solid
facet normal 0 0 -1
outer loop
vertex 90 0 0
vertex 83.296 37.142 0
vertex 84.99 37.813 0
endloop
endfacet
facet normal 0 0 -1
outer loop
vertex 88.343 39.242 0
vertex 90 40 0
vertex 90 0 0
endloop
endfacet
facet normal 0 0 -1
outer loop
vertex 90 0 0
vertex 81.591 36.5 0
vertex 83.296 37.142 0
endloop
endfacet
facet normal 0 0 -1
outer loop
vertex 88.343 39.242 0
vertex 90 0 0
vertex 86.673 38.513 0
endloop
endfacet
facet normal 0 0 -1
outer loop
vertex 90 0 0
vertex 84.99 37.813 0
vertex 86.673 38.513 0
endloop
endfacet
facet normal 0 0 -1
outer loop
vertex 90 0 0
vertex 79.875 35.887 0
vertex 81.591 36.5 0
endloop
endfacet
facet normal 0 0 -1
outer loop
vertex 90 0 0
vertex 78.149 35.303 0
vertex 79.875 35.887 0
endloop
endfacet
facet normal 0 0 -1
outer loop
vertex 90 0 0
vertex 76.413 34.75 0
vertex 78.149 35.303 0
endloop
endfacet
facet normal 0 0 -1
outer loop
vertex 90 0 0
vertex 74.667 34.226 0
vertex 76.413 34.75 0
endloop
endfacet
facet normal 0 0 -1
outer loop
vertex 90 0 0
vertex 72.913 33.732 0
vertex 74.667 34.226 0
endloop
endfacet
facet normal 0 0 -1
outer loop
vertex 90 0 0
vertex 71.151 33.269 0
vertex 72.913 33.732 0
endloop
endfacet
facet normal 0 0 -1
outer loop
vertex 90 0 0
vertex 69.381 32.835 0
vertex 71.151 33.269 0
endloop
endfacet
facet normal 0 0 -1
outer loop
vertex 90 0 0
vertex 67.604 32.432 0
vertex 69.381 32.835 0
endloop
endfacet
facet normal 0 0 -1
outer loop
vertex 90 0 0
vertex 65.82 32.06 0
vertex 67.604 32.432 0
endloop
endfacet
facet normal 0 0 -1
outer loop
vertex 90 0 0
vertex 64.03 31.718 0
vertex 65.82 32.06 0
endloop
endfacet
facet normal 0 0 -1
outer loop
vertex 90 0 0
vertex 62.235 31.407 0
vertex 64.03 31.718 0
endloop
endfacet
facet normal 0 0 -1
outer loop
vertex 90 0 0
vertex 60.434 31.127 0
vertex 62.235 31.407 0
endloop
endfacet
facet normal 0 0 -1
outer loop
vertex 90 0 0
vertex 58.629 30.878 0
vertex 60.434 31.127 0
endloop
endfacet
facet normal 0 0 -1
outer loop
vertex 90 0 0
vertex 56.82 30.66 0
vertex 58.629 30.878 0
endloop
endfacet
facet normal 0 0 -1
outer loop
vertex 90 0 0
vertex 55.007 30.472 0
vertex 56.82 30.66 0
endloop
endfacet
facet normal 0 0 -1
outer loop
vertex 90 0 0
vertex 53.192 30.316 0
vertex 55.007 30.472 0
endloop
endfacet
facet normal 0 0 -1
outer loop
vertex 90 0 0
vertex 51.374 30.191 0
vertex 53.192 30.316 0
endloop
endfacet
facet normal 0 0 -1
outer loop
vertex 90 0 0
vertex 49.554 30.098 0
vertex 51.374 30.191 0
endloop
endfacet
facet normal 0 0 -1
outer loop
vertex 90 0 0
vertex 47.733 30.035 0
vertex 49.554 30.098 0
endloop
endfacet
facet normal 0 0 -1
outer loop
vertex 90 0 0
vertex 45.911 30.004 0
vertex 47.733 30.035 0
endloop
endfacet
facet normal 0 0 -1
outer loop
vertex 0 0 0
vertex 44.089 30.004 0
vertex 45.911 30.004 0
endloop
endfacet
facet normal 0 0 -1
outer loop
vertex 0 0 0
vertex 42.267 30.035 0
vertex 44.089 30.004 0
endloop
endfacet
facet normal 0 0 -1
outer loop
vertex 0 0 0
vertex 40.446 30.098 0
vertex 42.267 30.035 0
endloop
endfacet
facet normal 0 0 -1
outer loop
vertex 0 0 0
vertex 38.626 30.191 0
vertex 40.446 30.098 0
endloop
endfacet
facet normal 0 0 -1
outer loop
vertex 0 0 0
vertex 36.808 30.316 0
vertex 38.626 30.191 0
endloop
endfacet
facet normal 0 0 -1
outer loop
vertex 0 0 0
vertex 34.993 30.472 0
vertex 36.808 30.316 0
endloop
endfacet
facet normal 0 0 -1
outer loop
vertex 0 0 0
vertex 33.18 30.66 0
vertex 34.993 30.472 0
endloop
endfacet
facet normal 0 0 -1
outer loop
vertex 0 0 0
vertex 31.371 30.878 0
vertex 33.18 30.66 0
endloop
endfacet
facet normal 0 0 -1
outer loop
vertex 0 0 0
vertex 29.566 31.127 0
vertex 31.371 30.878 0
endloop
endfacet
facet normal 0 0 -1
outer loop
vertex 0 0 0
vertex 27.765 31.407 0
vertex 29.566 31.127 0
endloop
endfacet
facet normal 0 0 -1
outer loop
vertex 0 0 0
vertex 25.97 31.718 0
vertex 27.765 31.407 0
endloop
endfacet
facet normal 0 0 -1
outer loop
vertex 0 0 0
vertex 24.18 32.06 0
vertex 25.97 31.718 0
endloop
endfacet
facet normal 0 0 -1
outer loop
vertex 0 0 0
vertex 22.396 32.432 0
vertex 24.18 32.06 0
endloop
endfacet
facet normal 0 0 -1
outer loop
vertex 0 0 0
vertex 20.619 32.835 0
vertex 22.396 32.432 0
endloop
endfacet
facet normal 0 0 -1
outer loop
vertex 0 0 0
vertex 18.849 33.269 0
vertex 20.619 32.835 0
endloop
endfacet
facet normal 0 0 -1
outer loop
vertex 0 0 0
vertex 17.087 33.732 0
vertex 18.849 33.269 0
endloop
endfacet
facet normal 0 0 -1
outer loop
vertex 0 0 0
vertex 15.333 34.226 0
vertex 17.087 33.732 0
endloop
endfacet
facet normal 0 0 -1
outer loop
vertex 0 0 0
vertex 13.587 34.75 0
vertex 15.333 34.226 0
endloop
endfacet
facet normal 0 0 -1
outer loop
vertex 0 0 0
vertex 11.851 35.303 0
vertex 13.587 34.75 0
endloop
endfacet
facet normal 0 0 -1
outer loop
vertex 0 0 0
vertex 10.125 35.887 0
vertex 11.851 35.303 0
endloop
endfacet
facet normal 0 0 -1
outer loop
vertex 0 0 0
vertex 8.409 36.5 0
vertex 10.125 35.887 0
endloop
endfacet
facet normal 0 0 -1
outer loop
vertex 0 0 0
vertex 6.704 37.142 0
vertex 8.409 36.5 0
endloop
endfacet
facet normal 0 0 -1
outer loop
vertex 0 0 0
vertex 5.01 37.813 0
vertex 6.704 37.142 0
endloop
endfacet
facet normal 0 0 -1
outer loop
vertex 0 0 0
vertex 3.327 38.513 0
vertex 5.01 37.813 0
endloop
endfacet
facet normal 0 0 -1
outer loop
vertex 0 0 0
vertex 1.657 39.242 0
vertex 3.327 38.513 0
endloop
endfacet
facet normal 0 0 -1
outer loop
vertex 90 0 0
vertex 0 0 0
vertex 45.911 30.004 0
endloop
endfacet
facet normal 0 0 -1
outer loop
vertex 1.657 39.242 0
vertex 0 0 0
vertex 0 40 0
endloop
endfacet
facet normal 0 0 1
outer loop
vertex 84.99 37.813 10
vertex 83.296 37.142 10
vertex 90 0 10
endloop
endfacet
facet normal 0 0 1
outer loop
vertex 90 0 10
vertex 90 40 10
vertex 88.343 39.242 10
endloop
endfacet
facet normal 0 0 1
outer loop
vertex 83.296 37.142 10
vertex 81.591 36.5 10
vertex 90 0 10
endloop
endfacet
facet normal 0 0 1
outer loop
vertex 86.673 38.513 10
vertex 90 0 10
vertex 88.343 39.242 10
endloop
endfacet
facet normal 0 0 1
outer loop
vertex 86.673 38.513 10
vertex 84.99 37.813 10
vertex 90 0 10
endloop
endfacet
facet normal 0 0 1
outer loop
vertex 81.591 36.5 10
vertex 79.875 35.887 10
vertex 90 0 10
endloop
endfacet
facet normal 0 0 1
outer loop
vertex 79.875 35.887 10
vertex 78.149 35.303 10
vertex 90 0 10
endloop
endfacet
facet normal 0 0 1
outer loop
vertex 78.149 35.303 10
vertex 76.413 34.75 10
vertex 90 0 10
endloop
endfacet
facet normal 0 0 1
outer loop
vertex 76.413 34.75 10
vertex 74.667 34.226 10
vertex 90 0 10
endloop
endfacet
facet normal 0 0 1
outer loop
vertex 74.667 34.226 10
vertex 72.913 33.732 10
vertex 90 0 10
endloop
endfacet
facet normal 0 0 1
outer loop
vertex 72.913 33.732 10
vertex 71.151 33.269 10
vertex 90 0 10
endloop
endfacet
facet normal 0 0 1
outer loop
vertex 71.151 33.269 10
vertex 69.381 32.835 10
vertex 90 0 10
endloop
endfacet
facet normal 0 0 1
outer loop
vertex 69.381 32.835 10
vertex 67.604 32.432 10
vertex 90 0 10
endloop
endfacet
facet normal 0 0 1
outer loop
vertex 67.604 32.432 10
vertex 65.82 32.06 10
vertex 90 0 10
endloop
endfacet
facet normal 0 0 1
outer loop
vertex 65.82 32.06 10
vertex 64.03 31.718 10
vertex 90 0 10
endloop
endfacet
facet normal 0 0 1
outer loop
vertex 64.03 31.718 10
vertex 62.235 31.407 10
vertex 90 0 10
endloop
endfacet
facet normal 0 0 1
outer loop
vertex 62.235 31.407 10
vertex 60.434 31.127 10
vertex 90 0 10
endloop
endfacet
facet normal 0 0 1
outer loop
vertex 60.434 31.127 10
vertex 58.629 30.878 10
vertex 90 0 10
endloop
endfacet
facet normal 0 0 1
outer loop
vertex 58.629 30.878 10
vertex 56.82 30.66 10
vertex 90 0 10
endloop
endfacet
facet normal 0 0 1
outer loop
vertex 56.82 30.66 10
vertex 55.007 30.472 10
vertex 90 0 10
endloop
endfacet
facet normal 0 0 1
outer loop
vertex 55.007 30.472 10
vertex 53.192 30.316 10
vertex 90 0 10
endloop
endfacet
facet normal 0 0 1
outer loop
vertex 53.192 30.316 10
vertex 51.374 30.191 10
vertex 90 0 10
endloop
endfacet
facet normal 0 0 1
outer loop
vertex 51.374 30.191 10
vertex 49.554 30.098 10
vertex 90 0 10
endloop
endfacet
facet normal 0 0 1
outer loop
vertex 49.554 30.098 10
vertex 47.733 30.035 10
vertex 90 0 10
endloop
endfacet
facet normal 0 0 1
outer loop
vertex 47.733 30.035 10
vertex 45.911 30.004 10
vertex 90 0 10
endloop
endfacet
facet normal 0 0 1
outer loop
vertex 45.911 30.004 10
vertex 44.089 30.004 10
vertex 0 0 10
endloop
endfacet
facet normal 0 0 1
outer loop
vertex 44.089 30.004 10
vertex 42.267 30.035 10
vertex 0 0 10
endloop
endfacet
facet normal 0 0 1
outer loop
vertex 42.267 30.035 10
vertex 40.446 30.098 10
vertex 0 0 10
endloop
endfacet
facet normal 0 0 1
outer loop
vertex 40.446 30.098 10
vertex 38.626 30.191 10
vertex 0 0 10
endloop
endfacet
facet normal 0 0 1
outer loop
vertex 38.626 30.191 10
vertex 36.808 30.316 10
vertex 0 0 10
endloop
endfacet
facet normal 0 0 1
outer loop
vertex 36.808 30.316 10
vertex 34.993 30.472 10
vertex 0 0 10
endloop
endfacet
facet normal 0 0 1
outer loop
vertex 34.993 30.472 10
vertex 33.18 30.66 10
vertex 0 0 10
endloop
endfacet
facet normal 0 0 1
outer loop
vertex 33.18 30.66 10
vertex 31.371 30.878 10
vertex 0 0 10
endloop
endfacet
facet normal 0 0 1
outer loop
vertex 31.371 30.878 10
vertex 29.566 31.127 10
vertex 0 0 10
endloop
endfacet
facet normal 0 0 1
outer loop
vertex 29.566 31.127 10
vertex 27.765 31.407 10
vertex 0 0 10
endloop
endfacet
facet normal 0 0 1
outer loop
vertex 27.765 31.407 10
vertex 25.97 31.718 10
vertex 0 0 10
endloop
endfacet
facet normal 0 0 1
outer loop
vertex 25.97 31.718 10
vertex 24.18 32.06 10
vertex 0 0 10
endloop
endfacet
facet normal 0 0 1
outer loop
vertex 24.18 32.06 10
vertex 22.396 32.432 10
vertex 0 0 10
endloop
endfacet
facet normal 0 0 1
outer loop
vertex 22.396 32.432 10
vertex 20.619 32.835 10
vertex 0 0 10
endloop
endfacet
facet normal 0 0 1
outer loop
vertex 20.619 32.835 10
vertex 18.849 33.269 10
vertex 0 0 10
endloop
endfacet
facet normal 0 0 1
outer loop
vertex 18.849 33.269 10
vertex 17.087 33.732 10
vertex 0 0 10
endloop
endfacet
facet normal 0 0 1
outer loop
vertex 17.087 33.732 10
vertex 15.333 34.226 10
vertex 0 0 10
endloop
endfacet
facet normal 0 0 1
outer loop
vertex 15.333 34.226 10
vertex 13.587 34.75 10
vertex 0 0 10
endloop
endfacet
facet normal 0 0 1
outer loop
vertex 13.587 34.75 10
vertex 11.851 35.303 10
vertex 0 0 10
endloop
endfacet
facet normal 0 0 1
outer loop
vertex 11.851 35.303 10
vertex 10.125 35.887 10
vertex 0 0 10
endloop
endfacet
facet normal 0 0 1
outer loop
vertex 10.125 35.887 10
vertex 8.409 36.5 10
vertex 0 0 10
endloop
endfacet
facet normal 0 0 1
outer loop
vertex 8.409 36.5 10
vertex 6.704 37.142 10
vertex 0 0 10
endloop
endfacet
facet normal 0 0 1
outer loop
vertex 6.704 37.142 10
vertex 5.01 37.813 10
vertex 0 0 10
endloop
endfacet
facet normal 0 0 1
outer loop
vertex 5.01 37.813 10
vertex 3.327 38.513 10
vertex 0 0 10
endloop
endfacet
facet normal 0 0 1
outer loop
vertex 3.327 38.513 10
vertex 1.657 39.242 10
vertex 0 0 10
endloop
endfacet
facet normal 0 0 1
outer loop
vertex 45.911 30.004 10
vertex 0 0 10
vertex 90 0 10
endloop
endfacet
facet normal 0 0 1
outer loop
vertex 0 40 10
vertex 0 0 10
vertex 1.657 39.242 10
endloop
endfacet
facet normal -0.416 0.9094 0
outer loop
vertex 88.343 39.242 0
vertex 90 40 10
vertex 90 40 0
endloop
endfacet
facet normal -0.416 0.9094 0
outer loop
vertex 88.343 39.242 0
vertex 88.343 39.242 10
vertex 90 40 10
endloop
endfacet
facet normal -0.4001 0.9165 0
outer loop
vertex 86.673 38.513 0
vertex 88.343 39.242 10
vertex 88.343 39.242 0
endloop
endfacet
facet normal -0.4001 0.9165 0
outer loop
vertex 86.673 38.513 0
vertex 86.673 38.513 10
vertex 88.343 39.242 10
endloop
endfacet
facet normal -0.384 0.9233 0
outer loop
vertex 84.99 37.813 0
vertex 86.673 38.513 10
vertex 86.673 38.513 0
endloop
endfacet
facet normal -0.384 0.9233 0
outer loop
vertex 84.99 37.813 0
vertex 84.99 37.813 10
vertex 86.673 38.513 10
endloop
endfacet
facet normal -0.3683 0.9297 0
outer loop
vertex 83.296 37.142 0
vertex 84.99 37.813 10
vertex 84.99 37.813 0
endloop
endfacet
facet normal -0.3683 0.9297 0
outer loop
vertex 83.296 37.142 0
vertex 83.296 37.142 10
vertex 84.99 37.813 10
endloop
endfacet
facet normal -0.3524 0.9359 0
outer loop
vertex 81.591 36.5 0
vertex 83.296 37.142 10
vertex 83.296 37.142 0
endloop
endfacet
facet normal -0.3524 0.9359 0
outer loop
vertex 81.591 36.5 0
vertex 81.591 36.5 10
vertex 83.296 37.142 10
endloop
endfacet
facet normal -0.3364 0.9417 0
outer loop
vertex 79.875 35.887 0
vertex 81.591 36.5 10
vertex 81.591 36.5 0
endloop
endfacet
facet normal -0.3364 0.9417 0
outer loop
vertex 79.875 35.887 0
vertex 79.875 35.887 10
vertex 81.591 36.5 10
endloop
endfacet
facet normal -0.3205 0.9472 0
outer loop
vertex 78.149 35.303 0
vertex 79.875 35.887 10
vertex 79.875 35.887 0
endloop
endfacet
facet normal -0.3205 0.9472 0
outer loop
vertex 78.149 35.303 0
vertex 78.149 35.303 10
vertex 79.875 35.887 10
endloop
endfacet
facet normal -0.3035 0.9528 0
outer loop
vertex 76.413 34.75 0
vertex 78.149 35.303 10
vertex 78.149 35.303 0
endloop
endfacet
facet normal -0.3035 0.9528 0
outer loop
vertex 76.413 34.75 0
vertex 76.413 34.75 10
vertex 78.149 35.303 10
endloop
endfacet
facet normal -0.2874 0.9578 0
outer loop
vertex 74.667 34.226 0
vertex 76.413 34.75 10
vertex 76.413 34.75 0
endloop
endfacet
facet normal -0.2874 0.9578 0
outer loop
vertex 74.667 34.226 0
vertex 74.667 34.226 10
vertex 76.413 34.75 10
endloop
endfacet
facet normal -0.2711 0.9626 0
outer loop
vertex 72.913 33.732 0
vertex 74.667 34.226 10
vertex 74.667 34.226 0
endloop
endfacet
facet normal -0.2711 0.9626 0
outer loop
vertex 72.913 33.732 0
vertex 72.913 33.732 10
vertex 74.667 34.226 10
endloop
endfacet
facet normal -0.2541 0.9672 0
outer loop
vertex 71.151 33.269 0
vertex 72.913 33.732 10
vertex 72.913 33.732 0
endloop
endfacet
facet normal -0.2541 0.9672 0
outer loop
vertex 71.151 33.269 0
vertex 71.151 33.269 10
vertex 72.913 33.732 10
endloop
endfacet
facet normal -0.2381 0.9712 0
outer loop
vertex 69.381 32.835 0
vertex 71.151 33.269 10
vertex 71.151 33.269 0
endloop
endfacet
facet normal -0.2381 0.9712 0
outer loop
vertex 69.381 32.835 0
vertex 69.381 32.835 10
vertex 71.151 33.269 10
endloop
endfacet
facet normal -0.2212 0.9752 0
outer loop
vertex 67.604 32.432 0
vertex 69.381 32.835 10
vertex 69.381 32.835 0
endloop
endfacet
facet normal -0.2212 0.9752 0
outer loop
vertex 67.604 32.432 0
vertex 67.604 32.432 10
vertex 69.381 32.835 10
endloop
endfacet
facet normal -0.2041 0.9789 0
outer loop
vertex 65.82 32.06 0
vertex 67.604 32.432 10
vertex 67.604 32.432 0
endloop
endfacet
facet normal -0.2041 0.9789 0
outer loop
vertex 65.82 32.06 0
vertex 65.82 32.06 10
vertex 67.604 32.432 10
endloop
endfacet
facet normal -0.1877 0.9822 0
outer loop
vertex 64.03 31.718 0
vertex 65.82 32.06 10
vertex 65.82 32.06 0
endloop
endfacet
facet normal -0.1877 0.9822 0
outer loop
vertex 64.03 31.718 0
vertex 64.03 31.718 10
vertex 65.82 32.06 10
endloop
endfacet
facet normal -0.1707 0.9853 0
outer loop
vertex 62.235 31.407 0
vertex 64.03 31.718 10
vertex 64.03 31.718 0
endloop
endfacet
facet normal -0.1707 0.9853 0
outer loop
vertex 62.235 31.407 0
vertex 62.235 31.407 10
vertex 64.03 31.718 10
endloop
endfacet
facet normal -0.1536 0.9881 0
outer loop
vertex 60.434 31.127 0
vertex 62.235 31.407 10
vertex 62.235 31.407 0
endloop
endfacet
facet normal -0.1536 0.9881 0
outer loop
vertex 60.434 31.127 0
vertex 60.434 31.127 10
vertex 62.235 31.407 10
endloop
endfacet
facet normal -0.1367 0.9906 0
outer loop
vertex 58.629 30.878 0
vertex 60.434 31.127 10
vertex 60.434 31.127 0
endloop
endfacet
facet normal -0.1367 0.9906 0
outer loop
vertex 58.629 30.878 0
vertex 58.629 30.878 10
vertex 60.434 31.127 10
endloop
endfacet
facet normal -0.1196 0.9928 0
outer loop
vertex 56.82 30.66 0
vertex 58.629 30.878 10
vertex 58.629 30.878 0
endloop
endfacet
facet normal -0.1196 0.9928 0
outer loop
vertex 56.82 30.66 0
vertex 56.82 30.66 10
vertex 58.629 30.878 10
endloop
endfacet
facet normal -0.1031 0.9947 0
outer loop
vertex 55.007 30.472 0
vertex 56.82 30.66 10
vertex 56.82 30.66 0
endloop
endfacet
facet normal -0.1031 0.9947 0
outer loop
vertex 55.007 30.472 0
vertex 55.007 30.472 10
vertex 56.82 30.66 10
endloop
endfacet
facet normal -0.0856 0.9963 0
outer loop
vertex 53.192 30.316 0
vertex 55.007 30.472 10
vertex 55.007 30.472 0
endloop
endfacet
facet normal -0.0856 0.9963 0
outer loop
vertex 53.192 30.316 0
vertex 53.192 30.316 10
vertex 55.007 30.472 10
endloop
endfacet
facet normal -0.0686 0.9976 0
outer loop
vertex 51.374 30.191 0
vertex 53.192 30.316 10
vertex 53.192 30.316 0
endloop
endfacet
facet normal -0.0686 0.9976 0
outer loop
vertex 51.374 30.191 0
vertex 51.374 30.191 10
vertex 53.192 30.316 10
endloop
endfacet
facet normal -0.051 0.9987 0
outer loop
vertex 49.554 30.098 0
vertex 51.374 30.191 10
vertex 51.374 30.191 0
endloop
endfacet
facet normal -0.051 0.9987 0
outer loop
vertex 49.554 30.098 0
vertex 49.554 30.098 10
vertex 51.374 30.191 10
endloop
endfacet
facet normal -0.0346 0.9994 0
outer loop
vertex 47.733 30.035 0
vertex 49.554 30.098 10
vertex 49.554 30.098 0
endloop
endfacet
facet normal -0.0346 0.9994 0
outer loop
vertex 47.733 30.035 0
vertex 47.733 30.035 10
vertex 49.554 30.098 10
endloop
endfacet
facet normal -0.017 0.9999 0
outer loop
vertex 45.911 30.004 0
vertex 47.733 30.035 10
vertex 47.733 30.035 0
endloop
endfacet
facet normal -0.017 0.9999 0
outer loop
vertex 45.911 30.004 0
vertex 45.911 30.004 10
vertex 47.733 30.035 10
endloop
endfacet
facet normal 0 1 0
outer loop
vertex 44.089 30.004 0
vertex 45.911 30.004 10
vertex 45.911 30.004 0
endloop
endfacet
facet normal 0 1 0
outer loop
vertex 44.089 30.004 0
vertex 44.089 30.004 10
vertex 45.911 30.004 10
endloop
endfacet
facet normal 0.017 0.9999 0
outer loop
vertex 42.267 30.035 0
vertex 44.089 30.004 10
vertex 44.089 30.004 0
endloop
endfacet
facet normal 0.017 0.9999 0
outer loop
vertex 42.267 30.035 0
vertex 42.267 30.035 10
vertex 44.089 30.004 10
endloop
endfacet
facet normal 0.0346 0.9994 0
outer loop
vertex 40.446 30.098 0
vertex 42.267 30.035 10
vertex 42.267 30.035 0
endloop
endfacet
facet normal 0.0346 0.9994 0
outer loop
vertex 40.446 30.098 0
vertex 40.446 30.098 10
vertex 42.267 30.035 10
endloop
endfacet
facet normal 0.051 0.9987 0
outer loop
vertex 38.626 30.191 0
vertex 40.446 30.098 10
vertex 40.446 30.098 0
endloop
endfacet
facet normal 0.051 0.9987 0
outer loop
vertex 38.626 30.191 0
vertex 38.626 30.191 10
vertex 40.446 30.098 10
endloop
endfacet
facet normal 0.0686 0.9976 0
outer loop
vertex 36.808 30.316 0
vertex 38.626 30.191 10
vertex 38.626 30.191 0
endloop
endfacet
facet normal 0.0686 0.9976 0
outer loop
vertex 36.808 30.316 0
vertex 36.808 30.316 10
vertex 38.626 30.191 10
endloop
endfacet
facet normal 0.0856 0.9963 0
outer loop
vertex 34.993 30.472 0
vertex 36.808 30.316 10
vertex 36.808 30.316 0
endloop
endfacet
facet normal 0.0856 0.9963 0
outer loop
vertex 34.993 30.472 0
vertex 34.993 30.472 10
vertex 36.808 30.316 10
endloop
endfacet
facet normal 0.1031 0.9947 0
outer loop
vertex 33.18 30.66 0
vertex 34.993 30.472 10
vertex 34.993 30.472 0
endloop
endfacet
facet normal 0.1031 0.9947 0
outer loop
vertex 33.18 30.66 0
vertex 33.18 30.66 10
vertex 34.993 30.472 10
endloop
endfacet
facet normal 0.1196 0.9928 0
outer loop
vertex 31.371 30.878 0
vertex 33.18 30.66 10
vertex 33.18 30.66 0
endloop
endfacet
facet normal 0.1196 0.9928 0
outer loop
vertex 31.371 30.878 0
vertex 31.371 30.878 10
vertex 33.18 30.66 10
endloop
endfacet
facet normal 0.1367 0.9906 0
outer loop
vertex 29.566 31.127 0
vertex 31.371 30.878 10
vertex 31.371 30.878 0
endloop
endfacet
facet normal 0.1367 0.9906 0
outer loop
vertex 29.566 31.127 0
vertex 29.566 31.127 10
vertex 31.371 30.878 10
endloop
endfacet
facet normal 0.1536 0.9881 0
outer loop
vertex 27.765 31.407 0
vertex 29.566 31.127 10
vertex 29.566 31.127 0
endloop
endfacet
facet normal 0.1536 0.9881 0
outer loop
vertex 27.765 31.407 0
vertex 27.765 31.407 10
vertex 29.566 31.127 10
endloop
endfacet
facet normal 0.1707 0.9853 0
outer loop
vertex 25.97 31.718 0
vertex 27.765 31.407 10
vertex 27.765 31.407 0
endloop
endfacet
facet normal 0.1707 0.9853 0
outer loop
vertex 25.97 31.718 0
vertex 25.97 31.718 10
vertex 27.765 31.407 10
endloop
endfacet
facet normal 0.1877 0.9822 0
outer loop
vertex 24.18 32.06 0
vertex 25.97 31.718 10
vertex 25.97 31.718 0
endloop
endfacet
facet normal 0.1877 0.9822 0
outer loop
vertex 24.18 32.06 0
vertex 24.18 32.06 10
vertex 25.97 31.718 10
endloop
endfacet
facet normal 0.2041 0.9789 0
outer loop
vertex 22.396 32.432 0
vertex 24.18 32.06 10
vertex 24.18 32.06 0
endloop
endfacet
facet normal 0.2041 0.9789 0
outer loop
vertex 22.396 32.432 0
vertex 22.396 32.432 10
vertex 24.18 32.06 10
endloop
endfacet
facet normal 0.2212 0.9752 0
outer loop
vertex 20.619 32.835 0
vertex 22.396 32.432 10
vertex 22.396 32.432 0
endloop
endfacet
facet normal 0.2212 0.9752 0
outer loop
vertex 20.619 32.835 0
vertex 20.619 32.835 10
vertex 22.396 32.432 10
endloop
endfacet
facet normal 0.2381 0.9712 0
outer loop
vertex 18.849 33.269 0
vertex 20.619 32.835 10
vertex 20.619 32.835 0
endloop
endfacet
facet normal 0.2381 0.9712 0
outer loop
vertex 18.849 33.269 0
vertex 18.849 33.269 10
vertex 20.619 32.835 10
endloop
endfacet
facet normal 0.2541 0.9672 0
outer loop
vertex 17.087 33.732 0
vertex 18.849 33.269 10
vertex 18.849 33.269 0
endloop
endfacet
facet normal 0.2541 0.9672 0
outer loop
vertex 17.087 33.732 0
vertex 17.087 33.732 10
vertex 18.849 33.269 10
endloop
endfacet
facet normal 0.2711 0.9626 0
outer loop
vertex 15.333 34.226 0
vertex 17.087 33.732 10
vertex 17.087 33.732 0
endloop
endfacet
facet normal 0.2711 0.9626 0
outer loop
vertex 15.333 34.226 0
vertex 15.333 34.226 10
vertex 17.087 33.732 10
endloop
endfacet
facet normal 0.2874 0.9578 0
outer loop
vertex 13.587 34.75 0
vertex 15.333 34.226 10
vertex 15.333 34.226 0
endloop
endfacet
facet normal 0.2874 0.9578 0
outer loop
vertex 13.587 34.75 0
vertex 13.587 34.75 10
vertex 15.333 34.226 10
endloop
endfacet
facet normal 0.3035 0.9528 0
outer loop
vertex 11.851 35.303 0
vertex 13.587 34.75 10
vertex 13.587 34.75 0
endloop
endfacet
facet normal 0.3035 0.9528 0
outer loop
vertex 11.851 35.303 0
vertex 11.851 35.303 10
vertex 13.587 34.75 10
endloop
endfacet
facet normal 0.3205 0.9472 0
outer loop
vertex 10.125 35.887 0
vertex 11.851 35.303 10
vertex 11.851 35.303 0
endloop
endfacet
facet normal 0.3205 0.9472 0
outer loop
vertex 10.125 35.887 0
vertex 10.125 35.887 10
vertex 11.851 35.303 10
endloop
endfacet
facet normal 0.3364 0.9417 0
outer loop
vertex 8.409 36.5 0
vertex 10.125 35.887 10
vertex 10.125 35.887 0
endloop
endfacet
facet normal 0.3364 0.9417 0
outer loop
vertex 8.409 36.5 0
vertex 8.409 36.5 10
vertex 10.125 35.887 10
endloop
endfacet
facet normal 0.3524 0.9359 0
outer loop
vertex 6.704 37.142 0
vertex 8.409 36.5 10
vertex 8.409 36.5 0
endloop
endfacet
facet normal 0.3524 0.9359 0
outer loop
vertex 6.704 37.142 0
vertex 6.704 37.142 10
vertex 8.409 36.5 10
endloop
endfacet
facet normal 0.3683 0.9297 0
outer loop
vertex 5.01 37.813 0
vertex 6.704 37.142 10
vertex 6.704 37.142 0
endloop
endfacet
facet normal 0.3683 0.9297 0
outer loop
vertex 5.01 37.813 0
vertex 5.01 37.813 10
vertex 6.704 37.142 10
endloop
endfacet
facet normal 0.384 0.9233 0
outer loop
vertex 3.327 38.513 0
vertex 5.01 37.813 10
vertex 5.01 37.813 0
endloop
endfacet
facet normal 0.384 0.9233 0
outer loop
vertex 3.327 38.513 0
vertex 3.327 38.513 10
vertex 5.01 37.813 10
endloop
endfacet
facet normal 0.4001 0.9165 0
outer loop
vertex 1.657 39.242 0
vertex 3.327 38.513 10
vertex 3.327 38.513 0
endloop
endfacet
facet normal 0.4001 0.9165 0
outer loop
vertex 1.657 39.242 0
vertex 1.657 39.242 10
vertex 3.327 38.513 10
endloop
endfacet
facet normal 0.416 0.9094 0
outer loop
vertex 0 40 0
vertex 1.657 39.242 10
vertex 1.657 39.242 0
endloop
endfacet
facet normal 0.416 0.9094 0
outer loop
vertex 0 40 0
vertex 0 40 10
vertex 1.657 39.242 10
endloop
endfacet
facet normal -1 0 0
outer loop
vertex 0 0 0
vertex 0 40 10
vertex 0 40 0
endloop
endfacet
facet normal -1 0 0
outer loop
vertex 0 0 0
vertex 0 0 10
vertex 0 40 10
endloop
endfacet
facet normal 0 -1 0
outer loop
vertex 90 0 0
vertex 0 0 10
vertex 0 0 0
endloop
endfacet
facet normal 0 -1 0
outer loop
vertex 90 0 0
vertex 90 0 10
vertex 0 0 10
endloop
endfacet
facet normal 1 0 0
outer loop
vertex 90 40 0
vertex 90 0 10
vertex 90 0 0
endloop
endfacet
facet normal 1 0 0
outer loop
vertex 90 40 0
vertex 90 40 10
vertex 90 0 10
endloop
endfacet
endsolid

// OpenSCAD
$fn = 32;

// ----------------------------------------------------------------------
// Arc profile plate: notch, 54 points
// ----------------------------------------------------------------------

// --- parameters (mm) ---
bar_l = 90;               // bar length, X
bar_w = 40;               // bar width, Y
notch_depth = 10;         // depth of the arc notch at mid-span
arc_r = 106.25;           // radius of the notch arc
arc_angle = 50.12;        // notch arc angle, degrees
arc_step = 1;             // sampling step of the notch arc, degrees
plate_t = 10;             // plate thickness, Z

profile = [[0, 0], [90, 0], [90, 40], [88.343, 39.242], [86.673, 38.513], [84.99, 37.813], [83.296, 37.142], [81.591, 36.5], [79.875, 35.887], [78.149, 35.303], [76.413, 34.75], [74.667, 34.226], [72.913, 33.732], [71.151, 33.269], [69.381, 32.835], [67.604, 32.432], [65.82, 32.06], [64.03, 31.718], [62.235, 31.407], [60.434, 31.127], [58.629, 30.878], [56.82, 30.66], [55.007, 30.472], [53.192, 30.316], [51.374, 30.191], [49.554, 30.098], [47.733, 30.035], [45.911, 30.004], [44.089, 30.004], [42.267, 30.035], [40.446, 30.098], [38.626, 30.191], [36.808, 30.316], [34.993, 30.472], [33.18, 30.66], [31.371, 30.878], [29.566, 31.127], [27.765, 31.407], [25.97, 31.718], [24.18, 32.06], [22.396, 32.432], [20.619, 32.835], [18.849, 33.269], [17.087, 33.732], [15.333, 34.226], [13.587, 34.75], [11.851, 35.303], [10.125, 35.887], [8.409, 36.5], [6.704, 37.142], [5.01, 37.813], [3.327, 38.513], [1.657, 39.242], [0, 40]];  // primary outline, 54 points, counter clockwise

// --- the one profile operation ---
linear_extrude(height = plate_t) polygon(points = profile);
